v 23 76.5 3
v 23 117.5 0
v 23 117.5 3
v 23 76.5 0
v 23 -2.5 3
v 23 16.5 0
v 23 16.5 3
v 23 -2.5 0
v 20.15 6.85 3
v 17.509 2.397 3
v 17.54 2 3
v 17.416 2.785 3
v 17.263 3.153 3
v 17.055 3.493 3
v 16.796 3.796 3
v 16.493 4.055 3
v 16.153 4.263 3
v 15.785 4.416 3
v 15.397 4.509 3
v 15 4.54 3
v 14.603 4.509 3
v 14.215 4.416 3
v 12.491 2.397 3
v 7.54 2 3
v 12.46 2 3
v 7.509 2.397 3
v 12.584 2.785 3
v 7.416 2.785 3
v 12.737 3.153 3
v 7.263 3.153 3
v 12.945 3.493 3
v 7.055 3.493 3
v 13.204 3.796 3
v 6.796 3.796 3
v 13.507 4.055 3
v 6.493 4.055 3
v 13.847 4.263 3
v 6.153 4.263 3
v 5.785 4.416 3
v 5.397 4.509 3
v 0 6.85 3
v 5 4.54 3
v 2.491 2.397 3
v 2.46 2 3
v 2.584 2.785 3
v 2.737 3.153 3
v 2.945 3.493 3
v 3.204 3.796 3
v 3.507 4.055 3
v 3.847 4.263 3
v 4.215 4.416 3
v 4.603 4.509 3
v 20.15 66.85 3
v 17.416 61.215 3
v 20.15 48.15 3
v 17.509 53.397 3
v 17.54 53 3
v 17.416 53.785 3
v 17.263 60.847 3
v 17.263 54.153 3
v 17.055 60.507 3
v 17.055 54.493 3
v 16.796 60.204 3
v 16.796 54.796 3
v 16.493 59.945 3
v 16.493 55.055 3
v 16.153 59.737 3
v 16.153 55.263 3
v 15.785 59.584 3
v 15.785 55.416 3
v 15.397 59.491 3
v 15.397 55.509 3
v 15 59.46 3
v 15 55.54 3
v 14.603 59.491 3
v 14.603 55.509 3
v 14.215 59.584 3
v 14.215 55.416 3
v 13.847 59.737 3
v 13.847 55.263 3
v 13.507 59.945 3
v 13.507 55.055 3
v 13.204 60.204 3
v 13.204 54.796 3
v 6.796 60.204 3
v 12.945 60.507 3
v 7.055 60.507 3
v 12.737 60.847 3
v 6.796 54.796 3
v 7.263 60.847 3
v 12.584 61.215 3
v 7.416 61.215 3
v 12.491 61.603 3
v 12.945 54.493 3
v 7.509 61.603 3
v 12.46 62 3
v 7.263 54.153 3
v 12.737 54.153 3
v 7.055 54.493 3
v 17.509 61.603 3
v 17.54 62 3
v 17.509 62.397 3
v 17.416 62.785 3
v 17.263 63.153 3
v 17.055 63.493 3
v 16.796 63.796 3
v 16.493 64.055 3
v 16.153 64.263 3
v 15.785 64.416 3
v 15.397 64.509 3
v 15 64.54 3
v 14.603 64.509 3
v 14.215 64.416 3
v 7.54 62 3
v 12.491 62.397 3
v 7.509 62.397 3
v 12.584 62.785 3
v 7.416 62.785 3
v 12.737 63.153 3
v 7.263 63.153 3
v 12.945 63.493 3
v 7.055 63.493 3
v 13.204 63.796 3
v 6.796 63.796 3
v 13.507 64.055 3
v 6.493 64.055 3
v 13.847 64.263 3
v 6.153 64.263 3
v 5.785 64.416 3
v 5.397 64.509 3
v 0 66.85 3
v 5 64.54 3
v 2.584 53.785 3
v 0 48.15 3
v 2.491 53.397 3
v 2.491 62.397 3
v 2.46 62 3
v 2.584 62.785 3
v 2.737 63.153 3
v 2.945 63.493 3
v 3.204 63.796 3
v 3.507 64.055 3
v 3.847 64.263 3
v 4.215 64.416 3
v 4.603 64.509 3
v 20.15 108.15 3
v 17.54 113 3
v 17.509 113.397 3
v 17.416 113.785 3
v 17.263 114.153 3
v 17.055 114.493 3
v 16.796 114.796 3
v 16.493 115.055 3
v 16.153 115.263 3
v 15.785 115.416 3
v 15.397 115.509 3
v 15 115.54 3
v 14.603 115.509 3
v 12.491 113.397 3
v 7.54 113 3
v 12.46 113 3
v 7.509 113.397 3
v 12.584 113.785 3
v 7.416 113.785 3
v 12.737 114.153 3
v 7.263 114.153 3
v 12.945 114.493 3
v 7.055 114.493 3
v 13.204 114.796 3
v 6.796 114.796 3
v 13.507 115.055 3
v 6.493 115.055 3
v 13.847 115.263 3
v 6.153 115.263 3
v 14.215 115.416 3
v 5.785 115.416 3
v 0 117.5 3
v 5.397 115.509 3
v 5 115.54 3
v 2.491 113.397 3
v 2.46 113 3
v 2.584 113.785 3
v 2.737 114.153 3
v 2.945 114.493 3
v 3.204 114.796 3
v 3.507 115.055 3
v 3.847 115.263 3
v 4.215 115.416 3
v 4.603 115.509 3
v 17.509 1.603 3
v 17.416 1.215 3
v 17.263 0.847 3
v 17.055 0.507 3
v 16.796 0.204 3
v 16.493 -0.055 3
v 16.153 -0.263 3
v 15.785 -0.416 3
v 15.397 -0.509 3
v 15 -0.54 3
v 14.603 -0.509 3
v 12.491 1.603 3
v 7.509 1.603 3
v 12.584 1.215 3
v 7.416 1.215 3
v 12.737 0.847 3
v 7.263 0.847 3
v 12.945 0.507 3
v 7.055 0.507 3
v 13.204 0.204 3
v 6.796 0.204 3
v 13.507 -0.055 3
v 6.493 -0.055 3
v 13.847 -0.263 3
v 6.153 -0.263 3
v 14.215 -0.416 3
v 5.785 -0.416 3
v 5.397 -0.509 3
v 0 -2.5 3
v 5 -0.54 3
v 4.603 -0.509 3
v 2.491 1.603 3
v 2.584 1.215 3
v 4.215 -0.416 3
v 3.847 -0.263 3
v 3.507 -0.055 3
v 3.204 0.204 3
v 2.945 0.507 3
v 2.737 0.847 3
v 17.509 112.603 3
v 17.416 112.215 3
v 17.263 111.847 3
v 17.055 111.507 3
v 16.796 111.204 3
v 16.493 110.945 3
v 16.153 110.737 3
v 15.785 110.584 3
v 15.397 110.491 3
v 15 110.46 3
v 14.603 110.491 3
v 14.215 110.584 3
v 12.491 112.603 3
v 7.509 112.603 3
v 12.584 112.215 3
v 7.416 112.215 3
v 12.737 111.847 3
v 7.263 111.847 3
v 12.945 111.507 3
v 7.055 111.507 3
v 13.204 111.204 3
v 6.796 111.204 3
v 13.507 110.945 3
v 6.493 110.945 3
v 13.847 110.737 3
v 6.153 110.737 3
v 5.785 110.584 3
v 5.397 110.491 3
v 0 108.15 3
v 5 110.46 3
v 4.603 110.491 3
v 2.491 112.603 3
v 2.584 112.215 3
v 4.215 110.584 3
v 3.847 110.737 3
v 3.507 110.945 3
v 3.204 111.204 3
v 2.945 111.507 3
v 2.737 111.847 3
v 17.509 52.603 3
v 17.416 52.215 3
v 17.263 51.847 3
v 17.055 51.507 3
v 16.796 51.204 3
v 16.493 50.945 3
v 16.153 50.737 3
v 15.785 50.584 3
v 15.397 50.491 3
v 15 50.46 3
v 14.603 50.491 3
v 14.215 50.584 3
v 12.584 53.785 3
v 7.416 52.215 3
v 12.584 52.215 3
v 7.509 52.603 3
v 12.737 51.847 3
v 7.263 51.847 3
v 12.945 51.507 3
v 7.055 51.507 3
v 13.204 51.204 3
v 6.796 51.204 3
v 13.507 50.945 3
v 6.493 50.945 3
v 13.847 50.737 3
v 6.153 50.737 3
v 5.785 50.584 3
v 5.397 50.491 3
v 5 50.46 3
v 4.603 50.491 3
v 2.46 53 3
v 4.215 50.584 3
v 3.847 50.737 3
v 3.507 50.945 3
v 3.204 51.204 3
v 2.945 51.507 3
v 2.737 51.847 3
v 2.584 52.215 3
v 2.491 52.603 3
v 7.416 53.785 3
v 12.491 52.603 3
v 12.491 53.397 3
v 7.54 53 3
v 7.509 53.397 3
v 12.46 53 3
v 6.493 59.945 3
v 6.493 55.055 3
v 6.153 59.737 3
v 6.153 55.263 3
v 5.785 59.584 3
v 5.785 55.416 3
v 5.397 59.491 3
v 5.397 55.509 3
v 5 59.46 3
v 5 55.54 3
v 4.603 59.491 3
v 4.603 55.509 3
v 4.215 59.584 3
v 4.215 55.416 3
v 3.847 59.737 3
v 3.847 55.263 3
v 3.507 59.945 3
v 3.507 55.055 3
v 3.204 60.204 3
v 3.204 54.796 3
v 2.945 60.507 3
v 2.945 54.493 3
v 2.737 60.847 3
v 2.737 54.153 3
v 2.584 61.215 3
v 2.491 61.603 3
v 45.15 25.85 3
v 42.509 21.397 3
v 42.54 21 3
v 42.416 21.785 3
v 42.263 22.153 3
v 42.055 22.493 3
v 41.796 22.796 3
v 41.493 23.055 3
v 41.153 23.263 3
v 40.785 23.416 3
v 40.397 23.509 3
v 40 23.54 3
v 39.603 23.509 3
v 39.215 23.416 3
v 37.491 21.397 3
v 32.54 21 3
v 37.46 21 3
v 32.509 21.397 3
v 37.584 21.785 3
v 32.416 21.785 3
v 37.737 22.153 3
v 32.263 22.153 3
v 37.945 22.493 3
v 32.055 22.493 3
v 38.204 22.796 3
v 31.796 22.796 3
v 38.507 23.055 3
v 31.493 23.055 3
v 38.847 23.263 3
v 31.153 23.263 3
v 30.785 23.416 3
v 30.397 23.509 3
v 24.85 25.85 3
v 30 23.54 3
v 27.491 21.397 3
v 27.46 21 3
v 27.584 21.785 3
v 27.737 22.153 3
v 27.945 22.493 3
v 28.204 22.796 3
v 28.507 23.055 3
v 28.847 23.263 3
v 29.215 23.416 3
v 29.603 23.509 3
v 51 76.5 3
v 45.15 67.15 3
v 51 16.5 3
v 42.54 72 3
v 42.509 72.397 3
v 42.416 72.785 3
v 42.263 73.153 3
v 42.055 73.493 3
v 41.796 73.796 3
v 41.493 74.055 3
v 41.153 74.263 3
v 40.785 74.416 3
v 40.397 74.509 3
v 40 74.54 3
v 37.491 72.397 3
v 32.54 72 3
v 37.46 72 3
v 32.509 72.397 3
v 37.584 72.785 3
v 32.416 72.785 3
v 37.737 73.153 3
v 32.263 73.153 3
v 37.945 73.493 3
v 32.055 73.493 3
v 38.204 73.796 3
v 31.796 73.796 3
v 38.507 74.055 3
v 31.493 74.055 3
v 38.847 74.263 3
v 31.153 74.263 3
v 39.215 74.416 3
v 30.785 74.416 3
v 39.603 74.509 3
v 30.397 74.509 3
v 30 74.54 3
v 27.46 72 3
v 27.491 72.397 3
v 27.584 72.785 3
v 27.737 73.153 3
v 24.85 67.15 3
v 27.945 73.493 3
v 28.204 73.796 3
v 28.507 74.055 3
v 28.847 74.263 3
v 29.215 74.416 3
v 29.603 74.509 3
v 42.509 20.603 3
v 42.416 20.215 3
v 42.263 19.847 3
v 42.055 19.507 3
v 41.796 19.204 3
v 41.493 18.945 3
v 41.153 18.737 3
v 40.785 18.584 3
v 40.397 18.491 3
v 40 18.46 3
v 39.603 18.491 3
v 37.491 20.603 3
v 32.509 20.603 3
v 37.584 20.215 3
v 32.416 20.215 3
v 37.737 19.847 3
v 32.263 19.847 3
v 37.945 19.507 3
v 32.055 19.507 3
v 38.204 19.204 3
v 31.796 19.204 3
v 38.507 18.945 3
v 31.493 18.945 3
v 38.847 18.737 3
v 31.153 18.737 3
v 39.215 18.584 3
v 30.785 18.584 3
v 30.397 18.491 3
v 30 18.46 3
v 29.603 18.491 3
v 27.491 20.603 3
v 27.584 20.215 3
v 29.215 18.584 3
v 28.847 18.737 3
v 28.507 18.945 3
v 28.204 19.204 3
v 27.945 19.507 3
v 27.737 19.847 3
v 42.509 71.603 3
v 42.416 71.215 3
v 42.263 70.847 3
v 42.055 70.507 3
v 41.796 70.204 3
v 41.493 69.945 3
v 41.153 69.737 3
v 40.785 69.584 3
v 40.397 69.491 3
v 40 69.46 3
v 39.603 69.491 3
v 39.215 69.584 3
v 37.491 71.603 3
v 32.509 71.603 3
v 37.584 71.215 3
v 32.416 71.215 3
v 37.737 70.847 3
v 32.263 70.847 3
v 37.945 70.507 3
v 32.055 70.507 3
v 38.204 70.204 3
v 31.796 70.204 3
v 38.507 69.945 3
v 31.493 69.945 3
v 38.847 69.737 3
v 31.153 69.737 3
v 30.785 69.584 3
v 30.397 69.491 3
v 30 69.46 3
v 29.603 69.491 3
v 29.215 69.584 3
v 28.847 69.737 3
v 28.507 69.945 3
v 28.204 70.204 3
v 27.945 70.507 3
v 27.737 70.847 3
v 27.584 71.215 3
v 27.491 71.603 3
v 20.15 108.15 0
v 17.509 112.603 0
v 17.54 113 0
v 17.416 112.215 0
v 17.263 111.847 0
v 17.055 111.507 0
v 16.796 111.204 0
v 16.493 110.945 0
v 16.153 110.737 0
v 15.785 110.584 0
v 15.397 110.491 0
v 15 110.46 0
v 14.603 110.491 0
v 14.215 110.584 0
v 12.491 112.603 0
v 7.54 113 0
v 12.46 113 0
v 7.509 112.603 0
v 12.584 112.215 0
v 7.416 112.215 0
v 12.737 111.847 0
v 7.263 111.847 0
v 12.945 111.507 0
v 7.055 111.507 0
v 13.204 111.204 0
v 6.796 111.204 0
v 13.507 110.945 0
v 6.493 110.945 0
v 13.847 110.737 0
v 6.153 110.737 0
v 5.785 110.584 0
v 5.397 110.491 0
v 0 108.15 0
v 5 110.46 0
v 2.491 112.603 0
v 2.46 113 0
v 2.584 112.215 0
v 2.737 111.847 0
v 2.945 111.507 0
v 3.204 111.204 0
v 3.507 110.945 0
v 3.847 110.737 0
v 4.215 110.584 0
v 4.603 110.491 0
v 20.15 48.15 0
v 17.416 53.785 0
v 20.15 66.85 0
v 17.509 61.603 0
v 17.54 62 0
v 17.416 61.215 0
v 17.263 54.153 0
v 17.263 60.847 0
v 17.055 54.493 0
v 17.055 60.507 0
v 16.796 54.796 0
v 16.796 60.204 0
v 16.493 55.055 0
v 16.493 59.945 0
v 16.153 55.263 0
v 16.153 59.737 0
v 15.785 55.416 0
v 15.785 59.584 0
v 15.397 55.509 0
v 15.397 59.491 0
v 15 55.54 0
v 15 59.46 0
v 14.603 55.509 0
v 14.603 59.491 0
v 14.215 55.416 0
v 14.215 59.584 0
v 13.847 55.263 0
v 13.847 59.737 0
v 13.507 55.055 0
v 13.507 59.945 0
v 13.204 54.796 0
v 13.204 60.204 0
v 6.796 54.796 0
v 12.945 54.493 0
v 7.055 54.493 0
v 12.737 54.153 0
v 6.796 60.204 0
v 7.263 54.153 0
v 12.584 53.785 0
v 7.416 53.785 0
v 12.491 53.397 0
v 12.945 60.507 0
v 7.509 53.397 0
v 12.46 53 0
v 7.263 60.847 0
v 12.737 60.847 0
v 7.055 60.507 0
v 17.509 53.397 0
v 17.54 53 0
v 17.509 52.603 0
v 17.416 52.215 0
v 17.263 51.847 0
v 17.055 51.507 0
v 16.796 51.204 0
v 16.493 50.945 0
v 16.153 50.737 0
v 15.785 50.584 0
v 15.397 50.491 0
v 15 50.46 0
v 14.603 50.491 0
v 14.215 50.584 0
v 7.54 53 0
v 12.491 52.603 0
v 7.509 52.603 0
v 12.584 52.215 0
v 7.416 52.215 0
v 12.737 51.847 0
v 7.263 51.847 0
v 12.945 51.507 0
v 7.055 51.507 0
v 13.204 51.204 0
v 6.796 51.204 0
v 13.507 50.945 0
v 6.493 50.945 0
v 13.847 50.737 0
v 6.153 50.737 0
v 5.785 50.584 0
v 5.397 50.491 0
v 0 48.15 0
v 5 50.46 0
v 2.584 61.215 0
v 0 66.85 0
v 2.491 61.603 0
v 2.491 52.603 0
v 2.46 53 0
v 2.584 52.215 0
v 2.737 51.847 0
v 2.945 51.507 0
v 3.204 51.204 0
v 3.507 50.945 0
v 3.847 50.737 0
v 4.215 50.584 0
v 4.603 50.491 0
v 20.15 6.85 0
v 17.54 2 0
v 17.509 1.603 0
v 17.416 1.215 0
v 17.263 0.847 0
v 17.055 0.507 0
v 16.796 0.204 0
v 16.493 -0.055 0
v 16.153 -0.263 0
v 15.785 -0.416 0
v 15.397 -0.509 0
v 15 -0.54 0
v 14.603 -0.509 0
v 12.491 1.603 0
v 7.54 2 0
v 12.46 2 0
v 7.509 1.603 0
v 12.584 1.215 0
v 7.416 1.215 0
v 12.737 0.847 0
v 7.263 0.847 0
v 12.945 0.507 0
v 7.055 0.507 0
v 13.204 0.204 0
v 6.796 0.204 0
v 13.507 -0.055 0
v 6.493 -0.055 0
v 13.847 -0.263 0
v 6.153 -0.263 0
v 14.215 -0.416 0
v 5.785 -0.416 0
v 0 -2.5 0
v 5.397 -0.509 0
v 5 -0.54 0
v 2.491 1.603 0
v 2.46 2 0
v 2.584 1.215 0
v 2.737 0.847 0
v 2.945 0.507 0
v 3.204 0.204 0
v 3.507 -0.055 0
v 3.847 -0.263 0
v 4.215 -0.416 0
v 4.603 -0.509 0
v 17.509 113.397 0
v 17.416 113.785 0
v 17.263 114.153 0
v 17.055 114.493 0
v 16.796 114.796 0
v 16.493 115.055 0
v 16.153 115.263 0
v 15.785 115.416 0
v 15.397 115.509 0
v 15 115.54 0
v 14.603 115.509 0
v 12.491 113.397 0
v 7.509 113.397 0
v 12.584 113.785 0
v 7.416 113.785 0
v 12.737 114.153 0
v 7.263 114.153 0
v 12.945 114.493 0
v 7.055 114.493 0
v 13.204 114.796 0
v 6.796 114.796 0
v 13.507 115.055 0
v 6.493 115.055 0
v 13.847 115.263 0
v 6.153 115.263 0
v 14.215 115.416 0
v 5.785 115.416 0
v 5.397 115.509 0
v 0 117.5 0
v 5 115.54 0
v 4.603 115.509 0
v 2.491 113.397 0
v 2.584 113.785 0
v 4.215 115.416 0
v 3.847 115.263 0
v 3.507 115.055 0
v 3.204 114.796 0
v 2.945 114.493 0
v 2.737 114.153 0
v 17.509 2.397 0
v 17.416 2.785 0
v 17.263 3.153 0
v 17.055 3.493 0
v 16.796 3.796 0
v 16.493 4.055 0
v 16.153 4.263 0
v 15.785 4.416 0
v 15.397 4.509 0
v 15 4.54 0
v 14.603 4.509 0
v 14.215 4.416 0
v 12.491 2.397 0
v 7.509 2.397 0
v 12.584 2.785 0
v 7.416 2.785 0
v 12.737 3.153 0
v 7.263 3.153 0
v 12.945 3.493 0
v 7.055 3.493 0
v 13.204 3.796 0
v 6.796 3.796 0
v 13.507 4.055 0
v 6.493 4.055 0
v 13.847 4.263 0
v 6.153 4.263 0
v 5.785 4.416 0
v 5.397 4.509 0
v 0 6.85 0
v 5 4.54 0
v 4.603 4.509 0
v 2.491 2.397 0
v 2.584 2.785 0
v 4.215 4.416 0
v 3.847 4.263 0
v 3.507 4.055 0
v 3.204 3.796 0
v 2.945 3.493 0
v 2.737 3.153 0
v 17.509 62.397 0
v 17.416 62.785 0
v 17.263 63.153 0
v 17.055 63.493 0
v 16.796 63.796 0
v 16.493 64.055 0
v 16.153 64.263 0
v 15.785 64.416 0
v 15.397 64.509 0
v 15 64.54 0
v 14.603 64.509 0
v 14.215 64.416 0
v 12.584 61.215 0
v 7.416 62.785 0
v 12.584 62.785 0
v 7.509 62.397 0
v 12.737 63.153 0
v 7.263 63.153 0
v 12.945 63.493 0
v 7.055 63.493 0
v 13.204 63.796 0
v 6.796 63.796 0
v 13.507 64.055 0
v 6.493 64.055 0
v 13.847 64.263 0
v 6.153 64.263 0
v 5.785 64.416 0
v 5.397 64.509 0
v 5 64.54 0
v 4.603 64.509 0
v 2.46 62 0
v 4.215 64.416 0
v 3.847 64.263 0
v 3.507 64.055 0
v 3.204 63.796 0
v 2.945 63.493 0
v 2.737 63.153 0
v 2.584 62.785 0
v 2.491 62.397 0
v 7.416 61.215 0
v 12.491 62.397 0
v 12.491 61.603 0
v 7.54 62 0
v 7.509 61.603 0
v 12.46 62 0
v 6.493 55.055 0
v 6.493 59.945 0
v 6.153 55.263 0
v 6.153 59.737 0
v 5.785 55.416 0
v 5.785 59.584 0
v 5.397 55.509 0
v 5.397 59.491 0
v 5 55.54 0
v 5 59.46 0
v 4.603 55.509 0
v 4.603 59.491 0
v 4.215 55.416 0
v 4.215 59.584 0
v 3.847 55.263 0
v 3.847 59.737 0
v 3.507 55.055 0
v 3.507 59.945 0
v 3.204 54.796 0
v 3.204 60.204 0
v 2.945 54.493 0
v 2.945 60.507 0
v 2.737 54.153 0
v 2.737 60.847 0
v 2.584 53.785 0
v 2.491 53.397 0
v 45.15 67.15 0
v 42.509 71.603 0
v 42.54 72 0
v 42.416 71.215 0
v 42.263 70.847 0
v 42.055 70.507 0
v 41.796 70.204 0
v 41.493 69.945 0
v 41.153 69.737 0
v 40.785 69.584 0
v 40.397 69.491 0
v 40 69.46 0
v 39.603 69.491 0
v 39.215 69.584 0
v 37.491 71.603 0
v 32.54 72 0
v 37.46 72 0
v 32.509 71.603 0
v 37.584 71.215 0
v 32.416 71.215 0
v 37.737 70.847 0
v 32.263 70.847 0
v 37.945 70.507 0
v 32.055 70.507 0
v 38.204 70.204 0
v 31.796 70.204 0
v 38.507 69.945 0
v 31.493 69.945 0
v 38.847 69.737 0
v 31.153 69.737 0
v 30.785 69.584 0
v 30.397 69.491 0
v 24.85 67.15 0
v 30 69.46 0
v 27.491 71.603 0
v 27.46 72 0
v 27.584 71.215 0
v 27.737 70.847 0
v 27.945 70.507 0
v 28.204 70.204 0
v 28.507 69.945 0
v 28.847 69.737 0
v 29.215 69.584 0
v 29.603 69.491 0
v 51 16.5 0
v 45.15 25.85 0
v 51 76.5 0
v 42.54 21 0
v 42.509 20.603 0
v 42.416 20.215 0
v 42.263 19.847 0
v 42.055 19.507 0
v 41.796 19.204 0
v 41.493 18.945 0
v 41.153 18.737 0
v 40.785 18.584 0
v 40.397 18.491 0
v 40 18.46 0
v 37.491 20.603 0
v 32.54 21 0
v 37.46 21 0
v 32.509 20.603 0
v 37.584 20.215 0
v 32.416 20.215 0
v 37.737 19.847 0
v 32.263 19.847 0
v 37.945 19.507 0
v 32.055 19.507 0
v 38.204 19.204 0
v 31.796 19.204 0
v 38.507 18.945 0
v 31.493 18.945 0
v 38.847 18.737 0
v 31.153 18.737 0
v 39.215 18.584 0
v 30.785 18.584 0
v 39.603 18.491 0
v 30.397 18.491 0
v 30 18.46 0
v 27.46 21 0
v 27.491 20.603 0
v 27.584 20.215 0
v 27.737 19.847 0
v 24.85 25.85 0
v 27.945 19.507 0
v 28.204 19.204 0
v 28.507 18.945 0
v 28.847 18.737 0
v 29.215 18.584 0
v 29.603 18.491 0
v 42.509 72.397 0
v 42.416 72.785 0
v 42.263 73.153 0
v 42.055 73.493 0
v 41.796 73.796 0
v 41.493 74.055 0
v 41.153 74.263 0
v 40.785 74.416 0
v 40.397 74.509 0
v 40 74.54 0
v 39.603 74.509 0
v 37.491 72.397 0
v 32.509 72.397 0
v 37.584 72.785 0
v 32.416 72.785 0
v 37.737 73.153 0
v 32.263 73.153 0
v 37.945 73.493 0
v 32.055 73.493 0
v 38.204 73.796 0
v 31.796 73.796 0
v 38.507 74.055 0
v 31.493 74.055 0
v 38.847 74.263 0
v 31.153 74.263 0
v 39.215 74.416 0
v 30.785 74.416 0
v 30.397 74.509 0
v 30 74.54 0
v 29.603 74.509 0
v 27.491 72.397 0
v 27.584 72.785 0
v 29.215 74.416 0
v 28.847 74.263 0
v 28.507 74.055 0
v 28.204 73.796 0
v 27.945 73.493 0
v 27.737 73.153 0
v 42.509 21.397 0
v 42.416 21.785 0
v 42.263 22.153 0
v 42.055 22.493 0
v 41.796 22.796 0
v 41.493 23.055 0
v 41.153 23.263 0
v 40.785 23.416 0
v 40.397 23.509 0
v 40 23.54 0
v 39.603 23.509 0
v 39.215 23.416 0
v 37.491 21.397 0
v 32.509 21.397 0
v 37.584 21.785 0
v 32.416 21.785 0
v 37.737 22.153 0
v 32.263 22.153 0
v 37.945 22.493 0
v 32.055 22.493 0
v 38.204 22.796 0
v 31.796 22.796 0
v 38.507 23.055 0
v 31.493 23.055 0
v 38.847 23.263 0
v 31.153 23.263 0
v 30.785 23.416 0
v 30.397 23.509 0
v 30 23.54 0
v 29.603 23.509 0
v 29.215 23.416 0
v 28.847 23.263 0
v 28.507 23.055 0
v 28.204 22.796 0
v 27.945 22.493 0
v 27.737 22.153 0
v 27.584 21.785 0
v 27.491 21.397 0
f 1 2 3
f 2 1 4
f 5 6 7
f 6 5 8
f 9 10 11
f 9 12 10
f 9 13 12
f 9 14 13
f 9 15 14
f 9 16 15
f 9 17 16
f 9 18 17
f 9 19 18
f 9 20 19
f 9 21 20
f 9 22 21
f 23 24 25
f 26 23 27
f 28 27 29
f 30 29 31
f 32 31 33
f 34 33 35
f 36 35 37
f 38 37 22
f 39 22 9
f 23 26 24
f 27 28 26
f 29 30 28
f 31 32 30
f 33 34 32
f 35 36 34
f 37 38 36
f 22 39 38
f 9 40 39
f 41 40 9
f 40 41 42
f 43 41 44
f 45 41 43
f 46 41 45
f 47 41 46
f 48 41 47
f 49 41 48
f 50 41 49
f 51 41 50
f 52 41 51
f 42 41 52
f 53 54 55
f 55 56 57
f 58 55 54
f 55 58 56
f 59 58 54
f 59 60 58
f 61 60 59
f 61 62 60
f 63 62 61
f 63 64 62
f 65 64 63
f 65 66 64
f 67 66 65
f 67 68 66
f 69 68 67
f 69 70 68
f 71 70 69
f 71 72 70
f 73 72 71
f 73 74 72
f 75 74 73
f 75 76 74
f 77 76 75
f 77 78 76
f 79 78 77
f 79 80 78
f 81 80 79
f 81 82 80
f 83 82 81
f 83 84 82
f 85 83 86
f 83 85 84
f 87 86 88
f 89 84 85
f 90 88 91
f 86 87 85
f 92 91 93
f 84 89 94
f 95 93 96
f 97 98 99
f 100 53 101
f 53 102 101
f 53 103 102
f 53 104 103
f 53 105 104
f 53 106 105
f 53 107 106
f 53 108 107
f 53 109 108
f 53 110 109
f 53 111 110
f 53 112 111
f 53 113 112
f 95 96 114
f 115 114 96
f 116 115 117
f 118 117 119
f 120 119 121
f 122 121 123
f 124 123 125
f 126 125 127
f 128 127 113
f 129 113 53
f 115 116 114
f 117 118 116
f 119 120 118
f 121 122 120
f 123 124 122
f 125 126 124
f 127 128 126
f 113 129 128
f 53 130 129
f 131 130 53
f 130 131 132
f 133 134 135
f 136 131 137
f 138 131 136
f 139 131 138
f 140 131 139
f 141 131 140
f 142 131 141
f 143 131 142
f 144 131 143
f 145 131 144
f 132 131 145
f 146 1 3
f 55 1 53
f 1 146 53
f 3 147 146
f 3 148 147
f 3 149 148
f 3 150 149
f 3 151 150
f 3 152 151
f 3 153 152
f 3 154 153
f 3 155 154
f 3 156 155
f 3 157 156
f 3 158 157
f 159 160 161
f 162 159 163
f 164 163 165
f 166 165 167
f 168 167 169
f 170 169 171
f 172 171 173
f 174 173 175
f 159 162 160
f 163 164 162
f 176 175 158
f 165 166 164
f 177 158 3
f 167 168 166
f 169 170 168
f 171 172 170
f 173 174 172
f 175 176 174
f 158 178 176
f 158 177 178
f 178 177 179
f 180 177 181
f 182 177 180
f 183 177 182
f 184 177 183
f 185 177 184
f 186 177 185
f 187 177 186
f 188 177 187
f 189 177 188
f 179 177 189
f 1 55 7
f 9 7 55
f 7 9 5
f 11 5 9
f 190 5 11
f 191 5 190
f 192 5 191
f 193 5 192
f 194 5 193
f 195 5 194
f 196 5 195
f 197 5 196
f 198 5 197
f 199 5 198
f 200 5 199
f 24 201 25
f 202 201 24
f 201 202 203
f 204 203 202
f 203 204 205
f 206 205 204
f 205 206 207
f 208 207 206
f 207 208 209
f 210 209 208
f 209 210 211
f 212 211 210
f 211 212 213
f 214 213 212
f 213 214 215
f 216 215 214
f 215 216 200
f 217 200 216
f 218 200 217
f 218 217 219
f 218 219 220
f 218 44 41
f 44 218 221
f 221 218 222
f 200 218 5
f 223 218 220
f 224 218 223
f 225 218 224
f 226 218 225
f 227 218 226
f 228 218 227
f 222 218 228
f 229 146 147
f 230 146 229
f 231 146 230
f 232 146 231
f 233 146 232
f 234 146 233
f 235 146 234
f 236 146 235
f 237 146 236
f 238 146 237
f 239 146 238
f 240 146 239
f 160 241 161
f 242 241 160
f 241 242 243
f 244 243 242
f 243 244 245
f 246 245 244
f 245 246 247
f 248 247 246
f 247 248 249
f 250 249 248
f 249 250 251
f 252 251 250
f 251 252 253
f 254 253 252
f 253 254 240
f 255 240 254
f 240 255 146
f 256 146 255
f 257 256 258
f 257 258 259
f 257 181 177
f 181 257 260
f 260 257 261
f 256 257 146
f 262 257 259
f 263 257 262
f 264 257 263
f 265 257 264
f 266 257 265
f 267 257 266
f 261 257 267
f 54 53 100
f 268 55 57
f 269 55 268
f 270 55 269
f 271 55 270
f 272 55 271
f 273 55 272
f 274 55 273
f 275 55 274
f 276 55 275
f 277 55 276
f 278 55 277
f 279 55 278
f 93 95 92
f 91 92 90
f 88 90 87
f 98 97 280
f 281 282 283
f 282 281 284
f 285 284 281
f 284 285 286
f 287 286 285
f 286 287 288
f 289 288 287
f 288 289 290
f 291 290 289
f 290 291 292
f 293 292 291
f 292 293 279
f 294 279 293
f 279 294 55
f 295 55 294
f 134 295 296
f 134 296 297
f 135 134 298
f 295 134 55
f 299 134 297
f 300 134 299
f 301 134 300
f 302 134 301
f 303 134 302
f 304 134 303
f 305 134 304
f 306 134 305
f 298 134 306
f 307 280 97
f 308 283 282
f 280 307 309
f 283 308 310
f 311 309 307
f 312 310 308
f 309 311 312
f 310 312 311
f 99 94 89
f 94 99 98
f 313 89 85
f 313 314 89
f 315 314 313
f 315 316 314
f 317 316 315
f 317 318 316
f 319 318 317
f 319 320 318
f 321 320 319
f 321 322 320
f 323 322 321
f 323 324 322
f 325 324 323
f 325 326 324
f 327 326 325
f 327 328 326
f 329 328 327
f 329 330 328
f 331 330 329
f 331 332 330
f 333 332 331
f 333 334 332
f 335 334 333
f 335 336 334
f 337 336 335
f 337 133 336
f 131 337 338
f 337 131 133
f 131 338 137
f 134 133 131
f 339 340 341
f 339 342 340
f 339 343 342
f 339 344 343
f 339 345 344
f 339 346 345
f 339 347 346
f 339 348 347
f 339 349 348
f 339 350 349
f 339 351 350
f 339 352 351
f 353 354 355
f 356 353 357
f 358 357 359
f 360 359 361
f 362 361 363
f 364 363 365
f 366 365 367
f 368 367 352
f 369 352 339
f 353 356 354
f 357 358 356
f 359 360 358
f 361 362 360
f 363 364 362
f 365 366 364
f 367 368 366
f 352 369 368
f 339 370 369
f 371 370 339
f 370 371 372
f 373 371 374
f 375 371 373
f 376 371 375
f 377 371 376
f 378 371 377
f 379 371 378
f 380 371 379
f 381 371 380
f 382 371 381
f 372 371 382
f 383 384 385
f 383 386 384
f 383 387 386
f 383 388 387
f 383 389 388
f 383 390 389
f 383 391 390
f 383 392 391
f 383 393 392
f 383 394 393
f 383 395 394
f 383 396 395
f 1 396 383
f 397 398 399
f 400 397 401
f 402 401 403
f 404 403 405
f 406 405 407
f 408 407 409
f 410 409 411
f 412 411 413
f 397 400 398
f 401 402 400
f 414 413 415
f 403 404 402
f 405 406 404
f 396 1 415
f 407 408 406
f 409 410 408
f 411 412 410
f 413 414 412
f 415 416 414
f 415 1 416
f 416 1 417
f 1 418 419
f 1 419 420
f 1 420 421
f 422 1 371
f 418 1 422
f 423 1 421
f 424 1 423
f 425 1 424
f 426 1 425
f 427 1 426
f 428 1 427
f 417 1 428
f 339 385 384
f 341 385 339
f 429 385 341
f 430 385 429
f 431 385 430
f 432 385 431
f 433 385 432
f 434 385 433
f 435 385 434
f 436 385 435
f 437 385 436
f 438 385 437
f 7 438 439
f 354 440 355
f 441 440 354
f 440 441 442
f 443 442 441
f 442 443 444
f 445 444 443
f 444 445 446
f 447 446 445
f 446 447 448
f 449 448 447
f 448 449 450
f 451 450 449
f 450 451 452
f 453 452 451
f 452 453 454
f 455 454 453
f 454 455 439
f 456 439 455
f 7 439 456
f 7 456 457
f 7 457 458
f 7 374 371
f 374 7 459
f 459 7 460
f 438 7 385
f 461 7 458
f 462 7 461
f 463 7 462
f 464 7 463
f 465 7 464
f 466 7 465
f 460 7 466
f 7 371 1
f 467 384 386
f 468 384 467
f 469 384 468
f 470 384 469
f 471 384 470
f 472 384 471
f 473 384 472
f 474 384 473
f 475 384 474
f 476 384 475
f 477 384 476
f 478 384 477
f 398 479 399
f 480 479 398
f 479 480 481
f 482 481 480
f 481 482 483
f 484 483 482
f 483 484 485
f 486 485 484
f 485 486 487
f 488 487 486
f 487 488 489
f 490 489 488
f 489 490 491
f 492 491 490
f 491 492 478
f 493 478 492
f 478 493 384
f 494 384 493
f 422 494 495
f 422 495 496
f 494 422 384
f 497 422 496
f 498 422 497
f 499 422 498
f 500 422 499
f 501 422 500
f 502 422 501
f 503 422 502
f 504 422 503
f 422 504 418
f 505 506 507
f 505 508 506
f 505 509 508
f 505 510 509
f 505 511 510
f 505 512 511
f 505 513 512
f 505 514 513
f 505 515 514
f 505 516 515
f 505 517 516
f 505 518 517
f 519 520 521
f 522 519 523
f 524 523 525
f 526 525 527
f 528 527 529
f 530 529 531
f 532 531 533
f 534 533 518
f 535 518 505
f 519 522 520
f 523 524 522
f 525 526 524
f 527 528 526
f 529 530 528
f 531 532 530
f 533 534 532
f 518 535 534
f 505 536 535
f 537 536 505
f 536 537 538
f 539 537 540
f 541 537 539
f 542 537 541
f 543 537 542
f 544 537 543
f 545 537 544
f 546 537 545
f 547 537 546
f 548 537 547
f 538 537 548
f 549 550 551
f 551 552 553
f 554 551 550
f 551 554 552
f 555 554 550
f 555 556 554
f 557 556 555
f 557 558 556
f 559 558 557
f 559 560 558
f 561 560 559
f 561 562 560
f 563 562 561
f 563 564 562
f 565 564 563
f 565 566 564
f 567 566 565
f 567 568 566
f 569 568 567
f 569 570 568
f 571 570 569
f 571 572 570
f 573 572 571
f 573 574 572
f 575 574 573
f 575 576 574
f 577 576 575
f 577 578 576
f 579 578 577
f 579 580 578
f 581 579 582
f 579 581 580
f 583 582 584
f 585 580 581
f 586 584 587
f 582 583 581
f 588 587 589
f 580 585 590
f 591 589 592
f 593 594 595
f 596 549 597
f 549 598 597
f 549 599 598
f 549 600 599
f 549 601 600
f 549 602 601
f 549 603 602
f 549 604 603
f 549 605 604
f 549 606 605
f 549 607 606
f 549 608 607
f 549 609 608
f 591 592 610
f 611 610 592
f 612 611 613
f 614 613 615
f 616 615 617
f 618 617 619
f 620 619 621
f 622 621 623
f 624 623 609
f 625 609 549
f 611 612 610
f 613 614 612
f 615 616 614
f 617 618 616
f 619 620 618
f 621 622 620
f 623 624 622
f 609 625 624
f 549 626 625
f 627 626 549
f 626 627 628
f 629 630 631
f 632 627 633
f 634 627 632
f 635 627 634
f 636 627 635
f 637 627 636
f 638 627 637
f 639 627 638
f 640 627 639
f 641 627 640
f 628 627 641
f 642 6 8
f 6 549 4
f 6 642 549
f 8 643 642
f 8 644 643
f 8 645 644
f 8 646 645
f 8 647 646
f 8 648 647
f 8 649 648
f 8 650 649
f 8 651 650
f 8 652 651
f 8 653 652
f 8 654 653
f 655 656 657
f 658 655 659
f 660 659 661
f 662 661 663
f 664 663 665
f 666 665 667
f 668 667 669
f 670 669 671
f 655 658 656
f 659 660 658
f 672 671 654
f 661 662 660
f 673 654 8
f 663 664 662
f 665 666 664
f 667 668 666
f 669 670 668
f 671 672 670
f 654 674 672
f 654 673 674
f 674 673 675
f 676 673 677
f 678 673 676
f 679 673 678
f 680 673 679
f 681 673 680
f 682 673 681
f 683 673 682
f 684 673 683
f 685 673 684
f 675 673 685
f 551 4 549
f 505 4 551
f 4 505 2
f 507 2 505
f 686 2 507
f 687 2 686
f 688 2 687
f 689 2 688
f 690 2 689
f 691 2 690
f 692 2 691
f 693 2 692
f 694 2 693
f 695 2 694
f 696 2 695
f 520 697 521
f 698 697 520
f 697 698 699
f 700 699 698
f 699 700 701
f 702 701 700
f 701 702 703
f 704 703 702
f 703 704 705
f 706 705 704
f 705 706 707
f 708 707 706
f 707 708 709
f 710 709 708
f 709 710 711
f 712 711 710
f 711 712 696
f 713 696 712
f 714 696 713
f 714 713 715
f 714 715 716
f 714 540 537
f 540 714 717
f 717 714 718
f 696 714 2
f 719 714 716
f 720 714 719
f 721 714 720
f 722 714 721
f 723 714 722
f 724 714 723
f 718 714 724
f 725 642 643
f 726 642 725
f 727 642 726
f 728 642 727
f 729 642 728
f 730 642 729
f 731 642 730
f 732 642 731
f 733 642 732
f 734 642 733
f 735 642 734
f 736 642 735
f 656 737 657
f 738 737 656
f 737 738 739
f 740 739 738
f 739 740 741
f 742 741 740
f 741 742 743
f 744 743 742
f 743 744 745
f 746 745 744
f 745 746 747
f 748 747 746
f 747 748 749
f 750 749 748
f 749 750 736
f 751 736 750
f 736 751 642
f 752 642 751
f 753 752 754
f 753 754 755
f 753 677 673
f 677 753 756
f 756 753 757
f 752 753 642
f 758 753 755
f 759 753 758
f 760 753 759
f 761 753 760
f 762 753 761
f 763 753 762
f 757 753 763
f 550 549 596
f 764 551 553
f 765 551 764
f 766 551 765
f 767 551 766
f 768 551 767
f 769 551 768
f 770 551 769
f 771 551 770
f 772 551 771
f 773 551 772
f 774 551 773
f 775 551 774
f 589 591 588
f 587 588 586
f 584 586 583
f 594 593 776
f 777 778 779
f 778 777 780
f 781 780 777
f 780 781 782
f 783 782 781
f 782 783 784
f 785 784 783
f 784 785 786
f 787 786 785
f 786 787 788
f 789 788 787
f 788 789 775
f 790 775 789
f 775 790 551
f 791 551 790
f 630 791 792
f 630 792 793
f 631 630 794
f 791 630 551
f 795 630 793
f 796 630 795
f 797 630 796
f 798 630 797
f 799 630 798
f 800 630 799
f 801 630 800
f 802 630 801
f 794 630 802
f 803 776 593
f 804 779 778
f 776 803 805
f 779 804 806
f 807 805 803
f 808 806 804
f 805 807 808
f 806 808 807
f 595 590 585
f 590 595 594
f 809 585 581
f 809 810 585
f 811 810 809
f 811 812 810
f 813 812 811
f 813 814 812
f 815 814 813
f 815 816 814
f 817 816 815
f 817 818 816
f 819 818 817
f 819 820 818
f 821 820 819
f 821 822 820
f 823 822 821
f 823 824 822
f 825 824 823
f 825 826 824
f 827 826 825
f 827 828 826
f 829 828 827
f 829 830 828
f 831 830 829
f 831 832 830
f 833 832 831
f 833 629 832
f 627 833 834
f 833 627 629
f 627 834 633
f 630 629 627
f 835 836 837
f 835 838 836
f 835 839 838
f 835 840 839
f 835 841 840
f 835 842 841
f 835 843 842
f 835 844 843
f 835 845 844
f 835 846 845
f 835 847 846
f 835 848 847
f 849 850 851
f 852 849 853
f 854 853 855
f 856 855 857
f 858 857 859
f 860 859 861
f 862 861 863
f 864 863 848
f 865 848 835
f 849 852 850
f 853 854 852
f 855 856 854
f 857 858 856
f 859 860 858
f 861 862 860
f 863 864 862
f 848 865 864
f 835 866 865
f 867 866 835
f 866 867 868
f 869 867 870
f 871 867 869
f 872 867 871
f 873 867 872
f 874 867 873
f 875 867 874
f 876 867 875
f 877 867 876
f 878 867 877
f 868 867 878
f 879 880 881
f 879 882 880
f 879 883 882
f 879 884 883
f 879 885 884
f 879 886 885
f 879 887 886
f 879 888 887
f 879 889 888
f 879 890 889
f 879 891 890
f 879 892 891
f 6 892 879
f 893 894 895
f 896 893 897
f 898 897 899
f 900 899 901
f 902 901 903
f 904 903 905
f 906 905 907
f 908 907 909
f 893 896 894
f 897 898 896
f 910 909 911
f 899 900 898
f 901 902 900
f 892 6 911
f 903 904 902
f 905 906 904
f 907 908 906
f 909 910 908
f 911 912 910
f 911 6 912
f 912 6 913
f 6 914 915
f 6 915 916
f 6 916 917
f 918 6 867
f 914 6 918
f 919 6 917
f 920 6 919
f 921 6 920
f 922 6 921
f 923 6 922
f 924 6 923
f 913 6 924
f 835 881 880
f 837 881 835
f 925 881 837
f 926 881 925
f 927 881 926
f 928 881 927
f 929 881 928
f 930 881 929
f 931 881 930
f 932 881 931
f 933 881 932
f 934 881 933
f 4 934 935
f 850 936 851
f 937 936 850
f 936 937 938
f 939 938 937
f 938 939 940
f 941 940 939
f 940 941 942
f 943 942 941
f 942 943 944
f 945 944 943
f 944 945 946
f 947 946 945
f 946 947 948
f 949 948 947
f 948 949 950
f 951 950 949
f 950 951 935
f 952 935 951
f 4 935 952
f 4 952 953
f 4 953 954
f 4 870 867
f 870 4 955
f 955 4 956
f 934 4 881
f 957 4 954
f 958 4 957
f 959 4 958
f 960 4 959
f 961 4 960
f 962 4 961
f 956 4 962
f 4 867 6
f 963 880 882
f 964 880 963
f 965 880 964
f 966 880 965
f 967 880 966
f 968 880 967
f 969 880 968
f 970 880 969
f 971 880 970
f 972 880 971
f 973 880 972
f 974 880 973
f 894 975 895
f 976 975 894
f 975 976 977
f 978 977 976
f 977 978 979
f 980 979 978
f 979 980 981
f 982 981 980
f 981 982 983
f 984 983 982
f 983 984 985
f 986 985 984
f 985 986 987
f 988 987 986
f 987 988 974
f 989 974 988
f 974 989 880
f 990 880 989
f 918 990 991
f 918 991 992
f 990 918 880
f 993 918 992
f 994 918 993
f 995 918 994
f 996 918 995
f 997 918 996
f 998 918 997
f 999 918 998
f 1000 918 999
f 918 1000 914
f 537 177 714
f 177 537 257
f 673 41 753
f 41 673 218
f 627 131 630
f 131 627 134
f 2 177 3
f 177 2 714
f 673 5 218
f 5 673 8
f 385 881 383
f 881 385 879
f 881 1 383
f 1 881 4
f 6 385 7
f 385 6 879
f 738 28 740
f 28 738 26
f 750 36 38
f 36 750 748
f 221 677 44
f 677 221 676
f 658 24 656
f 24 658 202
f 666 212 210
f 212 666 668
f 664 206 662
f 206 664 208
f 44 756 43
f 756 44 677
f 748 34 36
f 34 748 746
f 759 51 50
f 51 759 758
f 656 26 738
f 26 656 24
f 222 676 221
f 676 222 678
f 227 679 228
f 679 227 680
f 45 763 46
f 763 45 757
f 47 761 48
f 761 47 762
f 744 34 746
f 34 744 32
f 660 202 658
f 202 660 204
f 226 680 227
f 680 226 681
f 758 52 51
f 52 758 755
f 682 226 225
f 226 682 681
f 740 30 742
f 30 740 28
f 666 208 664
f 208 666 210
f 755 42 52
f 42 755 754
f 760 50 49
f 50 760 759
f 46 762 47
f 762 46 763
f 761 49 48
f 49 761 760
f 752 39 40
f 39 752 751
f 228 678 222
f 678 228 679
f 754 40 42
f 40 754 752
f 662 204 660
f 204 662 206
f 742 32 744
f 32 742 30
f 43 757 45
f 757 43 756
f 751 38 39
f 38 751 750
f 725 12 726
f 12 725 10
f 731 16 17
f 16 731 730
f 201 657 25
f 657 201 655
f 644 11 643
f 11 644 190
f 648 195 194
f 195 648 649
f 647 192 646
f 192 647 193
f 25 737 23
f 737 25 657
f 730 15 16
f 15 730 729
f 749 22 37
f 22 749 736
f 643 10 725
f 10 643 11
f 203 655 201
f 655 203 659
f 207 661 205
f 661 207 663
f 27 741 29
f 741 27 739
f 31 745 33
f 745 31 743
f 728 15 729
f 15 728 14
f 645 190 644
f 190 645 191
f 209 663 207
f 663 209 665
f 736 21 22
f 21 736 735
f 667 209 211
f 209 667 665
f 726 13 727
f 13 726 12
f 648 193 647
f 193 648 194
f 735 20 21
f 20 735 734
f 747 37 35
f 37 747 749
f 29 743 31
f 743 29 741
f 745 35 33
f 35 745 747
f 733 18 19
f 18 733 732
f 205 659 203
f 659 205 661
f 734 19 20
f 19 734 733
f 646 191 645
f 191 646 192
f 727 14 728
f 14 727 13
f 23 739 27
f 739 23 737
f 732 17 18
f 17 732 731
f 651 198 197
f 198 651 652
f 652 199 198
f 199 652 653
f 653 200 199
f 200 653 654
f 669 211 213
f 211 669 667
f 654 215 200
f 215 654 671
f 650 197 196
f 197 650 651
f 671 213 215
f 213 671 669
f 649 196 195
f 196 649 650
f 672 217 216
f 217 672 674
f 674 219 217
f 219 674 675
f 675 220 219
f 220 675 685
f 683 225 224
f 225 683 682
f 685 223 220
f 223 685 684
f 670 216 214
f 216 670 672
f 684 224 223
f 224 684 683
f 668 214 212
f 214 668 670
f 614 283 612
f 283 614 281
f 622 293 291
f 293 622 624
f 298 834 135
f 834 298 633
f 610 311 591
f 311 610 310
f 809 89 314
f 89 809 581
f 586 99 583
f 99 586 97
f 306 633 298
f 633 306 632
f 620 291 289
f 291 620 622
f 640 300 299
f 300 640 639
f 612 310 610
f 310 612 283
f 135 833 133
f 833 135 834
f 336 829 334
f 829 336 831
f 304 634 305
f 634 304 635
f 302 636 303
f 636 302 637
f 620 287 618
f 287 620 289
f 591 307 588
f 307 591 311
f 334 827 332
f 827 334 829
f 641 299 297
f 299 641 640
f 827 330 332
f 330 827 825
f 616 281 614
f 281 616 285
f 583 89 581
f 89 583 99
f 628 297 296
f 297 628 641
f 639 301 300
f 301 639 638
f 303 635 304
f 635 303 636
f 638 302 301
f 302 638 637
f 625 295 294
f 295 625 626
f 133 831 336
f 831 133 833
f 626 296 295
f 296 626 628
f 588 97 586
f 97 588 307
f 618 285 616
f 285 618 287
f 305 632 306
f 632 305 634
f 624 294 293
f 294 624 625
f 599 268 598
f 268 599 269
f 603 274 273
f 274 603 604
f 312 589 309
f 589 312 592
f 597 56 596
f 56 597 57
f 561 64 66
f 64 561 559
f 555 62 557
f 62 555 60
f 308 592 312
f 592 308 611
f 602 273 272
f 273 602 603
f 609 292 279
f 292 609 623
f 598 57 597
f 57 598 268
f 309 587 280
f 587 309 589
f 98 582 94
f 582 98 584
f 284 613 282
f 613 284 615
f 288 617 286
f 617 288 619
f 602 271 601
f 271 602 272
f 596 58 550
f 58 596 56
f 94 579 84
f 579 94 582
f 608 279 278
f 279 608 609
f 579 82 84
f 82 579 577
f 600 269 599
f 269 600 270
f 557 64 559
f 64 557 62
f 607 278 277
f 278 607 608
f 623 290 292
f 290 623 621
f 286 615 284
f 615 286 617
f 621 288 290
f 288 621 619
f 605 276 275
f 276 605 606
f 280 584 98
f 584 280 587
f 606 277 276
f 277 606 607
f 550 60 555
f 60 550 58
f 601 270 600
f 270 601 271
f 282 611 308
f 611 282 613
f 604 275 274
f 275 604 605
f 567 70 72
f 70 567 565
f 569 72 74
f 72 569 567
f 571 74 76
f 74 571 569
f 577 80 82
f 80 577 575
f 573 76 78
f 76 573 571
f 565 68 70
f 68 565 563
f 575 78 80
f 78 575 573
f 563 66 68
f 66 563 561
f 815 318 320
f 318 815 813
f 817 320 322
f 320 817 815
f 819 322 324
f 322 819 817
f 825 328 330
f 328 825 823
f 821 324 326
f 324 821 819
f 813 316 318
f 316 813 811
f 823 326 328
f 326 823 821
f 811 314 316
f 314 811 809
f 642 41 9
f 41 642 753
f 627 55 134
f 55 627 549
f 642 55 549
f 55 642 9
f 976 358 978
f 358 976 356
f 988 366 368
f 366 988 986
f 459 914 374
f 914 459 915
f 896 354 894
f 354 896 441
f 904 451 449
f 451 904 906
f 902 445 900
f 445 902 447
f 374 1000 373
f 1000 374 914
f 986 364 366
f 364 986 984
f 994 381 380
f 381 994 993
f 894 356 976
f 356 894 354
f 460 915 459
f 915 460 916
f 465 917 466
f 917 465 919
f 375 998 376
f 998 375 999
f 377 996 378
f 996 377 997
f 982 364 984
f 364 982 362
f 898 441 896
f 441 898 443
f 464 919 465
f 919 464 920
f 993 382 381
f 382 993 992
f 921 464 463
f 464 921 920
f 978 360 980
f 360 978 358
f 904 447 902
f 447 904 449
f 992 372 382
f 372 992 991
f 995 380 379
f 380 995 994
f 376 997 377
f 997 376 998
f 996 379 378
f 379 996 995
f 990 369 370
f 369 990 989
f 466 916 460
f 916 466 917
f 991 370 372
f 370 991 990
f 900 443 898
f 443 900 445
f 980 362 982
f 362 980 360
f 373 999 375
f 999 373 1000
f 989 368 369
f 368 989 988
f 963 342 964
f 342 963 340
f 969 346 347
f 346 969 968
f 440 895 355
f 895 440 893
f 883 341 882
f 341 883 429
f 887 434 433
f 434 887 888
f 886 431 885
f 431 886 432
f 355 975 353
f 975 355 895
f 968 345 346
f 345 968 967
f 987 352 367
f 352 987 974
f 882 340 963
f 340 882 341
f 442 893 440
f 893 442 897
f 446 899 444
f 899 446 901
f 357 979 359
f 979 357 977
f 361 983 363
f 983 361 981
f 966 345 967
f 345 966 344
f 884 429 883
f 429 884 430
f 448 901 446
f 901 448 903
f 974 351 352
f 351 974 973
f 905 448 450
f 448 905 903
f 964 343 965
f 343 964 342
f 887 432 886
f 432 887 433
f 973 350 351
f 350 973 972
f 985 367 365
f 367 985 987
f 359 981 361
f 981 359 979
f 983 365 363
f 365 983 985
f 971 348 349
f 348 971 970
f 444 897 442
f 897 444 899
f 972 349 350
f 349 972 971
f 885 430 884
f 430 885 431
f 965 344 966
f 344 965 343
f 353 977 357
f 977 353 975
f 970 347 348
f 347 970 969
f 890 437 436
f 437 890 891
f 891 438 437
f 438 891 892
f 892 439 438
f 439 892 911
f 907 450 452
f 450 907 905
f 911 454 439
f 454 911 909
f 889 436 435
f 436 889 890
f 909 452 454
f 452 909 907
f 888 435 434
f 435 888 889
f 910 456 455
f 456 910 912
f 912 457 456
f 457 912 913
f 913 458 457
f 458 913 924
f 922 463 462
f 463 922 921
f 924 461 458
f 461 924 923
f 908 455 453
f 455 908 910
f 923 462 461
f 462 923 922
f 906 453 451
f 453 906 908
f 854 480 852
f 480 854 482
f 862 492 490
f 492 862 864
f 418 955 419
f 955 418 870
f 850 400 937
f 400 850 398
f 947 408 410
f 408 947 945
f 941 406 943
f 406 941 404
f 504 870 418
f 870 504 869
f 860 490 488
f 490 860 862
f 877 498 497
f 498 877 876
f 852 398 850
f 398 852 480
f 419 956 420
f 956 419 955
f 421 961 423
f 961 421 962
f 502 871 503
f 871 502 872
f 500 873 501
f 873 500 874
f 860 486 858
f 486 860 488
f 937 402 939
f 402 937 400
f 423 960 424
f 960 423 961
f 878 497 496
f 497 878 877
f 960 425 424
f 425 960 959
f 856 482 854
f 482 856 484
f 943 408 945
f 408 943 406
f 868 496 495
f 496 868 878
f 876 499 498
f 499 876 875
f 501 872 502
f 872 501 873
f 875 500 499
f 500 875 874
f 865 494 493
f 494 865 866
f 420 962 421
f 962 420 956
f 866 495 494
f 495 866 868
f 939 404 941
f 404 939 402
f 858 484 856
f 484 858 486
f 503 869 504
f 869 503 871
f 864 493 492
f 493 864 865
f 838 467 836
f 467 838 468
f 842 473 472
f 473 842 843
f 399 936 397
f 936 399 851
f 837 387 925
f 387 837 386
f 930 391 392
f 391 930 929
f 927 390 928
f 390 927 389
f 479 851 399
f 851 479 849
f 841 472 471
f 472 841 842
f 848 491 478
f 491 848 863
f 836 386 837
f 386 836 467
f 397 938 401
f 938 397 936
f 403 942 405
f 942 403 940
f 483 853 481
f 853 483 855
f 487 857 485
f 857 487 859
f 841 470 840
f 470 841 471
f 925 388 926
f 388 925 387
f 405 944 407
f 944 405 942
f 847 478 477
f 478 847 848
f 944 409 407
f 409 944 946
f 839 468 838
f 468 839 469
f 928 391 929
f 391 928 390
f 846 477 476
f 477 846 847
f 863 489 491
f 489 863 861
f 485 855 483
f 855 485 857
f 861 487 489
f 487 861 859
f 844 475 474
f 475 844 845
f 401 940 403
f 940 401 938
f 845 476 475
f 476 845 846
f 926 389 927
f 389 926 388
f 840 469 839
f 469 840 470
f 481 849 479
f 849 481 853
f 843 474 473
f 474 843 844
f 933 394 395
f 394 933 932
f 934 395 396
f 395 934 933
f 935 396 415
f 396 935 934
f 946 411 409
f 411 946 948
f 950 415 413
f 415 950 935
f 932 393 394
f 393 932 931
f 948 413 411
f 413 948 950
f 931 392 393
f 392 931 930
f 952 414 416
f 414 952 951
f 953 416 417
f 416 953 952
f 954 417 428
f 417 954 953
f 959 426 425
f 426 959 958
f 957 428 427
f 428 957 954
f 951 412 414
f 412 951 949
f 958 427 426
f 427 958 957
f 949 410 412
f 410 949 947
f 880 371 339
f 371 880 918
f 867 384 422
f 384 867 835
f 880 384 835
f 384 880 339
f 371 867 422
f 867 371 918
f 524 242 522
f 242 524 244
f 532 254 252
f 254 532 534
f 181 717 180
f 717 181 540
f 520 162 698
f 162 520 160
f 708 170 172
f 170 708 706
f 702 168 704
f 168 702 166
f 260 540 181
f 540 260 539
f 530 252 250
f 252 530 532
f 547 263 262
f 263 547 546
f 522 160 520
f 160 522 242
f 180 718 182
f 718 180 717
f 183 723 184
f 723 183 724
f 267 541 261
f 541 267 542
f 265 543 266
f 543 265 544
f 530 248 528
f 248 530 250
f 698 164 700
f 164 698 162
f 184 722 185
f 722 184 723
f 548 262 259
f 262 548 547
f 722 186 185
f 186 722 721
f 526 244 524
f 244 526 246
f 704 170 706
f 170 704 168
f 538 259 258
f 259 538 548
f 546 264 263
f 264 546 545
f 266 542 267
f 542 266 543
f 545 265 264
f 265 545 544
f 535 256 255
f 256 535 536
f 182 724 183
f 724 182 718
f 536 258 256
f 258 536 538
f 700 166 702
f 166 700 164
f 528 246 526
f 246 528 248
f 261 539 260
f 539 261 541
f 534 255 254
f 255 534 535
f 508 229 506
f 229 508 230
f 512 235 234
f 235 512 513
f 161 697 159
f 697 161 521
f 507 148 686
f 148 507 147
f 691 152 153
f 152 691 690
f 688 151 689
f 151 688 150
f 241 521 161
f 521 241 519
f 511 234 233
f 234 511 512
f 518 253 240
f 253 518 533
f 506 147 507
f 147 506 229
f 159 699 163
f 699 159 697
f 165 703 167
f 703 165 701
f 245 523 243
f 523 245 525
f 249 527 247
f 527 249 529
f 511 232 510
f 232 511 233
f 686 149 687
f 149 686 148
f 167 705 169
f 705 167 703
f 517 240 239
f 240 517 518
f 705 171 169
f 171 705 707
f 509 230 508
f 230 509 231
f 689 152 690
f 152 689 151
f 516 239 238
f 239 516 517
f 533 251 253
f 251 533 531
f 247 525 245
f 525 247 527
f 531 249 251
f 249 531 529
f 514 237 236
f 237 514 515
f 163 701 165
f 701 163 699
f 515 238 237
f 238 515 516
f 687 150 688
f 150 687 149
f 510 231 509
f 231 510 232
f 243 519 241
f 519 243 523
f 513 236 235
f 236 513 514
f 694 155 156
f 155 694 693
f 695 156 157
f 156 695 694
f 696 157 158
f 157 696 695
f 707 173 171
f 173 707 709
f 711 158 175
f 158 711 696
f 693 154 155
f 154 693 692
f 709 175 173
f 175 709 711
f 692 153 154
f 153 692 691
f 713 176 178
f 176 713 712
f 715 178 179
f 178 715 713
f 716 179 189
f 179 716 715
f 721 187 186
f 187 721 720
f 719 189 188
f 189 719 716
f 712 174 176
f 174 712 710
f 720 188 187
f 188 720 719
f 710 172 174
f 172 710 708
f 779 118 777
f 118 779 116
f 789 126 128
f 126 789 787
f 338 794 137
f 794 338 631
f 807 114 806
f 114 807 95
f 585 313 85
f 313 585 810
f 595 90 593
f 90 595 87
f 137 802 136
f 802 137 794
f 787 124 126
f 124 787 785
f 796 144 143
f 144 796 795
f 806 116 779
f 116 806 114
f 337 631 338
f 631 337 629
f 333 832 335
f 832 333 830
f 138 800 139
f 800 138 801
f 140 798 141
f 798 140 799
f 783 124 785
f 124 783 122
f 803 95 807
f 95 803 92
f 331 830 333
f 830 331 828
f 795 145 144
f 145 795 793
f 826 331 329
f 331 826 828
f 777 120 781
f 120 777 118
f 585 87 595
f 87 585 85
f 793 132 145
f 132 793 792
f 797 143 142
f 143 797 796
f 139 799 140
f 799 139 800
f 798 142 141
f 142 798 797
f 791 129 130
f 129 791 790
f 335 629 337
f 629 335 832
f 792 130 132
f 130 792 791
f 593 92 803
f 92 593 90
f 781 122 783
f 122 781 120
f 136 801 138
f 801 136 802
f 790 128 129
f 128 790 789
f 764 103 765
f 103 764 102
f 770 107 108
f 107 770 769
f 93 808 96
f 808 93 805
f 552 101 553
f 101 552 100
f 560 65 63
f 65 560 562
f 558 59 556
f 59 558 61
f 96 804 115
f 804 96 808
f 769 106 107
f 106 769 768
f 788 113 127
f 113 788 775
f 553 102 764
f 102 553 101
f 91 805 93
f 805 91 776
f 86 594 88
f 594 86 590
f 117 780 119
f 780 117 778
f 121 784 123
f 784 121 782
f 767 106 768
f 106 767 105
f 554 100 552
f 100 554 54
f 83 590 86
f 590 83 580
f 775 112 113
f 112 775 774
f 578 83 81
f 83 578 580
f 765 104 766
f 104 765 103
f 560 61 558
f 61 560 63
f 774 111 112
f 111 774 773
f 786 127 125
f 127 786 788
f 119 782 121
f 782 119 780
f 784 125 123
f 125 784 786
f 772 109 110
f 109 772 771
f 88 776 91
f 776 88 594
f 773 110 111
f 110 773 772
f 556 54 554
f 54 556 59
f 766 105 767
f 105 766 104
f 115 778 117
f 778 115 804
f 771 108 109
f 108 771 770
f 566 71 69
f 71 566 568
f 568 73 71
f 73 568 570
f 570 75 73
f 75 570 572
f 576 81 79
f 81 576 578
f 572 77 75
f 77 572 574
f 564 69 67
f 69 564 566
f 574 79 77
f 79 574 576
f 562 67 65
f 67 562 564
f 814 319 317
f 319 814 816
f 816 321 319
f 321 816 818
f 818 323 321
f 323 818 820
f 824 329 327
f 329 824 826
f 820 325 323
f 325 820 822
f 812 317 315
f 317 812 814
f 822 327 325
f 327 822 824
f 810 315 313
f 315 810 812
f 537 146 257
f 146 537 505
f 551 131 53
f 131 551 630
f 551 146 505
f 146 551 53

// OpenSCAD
// Values measured from an actual motor
MOTOR_BASE_LENGTH = 41;
MOTOR_BASE_WIDTH  = 20;
MOTOR_BASE_HEIGHT = 39.3;
MOTOR_PLUG_HEIGHT = 4;
MOTOR_SHAFT_OFFSET = 10;

MOUNT_BRACKET_HEIGHT = 29;
MOUNT_BRACKET_THICKNESS = 2;
MOUNT_BRACKET_LENGTH = 7;
MOUNT_SCREW_DIAMETER = 5.08; // 0.2"
MOUNT_SCREW_HOLE_CENTER_TO_CENTER_DISTANCE = 10;
MOUNT_SCREW_HOLE_OFFSET_FROM_BASE_X = 5;

MOUNT_SCREW_HOLE_OFFSET_FROM_BASE_Y = (MOTOR_BASE_WIDTH - MOUNT_SCREW_HOLE_CENTER_TO_CENTER_DISTANCE) / 2;
// ===================================

//preview();
motor_mount();

module preview() {
    display_model();

    translate([-57, 33.7, 51])
        rotate([-90, 0, -90])
            motor_model();

    translate([-57, 52.7, 26])
        rotate([-90, 0, -90])
            motor_model();

    translate([-57, 52.7, 51])
        mirror([0, 1, 0])
            rotate([-90, 0, -90])
                motor_model();

    translate([-26, -14.3, 51])
        rotate([0, 90, 0])
            motor_mount();
}


module motor_mount() {
    difference() {
        union() {
            translate([0, -2.5, 0])
                cube([23, 120, 3]);
            translate([23, 16.5, 0])
                cube([28, 60, 3]);
        }

        translate([51, 14.3, 25.7]) {
            rotate([0, -90, 0]) {
                union() {
                    translate([-57, 33.7, 51])
                        rotate([-90, 0, -90])
                            motor_model(negative=true);

                    translate([-57, 52.7, 26])
                        rotate([-90, 0, -90])
                            motor_model(negative=true);

                    translate([-57, 52.7, 51])
                        mirror([0, 1, 0])
                            rotate([-90, 0, -90])
                                motor_model(negative=true);
                }
            }
        }
    }
}

module display_model() {
    translate([29, 50, 16])
        import("braille_display_model.stl", convexity=5);
}

module motor_model(negative=false) {
    module bracket() {
        difference() {
            cube([MOUNT_BRACKET_LENGTH, MOTOR_BASE_WIDTH, MOUNT_BRACKET_THICKNESS]);
            translate([MOUNT_SCREW_HOLE_OFFSET_FROM_BASE_X, MOUNT_SCREW_HOLE_OFFSET_FROM_BASE_Y, 0])
                cylinder(h=MOUNT_BRACKET_THICKNESS, d=MOUNT_SCREW_DIAMETER, $fn=40);
            translate([MOUNT_SCREW_HOLE_OFFSET_FROM_BASE_X,
                       MOUNT_SCREW_HOLE_OFFSET_FROM_BASE_Y + MOUNT_SCREW_HOLE_CENTER_TO_CENTER_DISTANCE,
                       0])
                cylinder(h=MOUNT_BRACKET_THICKNESS, d=MOUNT_SCREW_DIAMETER, $fn=40);
        }

        if (negative) {
            translate([MOUNT_SCREW_HOLE_OFFSET_FROM_BASE_X,
                       MOUNT_SCREW_HOLE_OFFSET_FROM_BASE_Y + MOUNT_SCREW_HOLE_CENTER_TO_CENTER_DISTANCE,
                       0])
                cylinder(h=10, d=MOUNT_SCREW_DIAMETER, $fn=40);
            translate([MOUNT_SCREW_HOLE_OFFSET_FROM_BASE_X, MOUNT_SCREW_HOLE_OFFSET_FROM_BASE_Y, 0])
                cylinder(h=10, d=MOUNT_SCREW_DIAMETER, $fn=40);
        }
    }

    color("cyan")
    if (!negative) {
        cube([MOTOR_BASE_LENGTH, MOTOR_BASE_WIDTH, MOTOR_BASE_HEIGHT]);
    } else {
        negative_offset = 0.3;
        translate([-negative_offset/2, -negative_offset/2, 0])
            cube([MOTOR_BASE_LENGTH + negative_offset, MOTOR_BASE_WIDTH + negative_offset, MOTOR_BASE_HEIGHT]);
    }

    color("red")
    translate([MOTOR_SHAFT_OFFSET, MOTOR_BASE_WIDTH / 2, MOTOR_BASE_HEIGHT]) {
        cylinder(h=5, d=6, $fn=40);
    }

    translate([-4, -7/2 + MOTOR_BASE_WIDTH / 2, MOTOR_PLUG_HEIGHT]) {
        cube([4, 7, 4]);
    }

    translate([MOTOR_BASE_LENGTH, 0, MOUNT_BRACKET_HEIGHT]) {
        bracket();
    }

    mirror([1, 0, 0]) {
        translate([0, 0, MOUNT_BRACKET_HEIGHT]) {
            bracket();
        }
    }
}
